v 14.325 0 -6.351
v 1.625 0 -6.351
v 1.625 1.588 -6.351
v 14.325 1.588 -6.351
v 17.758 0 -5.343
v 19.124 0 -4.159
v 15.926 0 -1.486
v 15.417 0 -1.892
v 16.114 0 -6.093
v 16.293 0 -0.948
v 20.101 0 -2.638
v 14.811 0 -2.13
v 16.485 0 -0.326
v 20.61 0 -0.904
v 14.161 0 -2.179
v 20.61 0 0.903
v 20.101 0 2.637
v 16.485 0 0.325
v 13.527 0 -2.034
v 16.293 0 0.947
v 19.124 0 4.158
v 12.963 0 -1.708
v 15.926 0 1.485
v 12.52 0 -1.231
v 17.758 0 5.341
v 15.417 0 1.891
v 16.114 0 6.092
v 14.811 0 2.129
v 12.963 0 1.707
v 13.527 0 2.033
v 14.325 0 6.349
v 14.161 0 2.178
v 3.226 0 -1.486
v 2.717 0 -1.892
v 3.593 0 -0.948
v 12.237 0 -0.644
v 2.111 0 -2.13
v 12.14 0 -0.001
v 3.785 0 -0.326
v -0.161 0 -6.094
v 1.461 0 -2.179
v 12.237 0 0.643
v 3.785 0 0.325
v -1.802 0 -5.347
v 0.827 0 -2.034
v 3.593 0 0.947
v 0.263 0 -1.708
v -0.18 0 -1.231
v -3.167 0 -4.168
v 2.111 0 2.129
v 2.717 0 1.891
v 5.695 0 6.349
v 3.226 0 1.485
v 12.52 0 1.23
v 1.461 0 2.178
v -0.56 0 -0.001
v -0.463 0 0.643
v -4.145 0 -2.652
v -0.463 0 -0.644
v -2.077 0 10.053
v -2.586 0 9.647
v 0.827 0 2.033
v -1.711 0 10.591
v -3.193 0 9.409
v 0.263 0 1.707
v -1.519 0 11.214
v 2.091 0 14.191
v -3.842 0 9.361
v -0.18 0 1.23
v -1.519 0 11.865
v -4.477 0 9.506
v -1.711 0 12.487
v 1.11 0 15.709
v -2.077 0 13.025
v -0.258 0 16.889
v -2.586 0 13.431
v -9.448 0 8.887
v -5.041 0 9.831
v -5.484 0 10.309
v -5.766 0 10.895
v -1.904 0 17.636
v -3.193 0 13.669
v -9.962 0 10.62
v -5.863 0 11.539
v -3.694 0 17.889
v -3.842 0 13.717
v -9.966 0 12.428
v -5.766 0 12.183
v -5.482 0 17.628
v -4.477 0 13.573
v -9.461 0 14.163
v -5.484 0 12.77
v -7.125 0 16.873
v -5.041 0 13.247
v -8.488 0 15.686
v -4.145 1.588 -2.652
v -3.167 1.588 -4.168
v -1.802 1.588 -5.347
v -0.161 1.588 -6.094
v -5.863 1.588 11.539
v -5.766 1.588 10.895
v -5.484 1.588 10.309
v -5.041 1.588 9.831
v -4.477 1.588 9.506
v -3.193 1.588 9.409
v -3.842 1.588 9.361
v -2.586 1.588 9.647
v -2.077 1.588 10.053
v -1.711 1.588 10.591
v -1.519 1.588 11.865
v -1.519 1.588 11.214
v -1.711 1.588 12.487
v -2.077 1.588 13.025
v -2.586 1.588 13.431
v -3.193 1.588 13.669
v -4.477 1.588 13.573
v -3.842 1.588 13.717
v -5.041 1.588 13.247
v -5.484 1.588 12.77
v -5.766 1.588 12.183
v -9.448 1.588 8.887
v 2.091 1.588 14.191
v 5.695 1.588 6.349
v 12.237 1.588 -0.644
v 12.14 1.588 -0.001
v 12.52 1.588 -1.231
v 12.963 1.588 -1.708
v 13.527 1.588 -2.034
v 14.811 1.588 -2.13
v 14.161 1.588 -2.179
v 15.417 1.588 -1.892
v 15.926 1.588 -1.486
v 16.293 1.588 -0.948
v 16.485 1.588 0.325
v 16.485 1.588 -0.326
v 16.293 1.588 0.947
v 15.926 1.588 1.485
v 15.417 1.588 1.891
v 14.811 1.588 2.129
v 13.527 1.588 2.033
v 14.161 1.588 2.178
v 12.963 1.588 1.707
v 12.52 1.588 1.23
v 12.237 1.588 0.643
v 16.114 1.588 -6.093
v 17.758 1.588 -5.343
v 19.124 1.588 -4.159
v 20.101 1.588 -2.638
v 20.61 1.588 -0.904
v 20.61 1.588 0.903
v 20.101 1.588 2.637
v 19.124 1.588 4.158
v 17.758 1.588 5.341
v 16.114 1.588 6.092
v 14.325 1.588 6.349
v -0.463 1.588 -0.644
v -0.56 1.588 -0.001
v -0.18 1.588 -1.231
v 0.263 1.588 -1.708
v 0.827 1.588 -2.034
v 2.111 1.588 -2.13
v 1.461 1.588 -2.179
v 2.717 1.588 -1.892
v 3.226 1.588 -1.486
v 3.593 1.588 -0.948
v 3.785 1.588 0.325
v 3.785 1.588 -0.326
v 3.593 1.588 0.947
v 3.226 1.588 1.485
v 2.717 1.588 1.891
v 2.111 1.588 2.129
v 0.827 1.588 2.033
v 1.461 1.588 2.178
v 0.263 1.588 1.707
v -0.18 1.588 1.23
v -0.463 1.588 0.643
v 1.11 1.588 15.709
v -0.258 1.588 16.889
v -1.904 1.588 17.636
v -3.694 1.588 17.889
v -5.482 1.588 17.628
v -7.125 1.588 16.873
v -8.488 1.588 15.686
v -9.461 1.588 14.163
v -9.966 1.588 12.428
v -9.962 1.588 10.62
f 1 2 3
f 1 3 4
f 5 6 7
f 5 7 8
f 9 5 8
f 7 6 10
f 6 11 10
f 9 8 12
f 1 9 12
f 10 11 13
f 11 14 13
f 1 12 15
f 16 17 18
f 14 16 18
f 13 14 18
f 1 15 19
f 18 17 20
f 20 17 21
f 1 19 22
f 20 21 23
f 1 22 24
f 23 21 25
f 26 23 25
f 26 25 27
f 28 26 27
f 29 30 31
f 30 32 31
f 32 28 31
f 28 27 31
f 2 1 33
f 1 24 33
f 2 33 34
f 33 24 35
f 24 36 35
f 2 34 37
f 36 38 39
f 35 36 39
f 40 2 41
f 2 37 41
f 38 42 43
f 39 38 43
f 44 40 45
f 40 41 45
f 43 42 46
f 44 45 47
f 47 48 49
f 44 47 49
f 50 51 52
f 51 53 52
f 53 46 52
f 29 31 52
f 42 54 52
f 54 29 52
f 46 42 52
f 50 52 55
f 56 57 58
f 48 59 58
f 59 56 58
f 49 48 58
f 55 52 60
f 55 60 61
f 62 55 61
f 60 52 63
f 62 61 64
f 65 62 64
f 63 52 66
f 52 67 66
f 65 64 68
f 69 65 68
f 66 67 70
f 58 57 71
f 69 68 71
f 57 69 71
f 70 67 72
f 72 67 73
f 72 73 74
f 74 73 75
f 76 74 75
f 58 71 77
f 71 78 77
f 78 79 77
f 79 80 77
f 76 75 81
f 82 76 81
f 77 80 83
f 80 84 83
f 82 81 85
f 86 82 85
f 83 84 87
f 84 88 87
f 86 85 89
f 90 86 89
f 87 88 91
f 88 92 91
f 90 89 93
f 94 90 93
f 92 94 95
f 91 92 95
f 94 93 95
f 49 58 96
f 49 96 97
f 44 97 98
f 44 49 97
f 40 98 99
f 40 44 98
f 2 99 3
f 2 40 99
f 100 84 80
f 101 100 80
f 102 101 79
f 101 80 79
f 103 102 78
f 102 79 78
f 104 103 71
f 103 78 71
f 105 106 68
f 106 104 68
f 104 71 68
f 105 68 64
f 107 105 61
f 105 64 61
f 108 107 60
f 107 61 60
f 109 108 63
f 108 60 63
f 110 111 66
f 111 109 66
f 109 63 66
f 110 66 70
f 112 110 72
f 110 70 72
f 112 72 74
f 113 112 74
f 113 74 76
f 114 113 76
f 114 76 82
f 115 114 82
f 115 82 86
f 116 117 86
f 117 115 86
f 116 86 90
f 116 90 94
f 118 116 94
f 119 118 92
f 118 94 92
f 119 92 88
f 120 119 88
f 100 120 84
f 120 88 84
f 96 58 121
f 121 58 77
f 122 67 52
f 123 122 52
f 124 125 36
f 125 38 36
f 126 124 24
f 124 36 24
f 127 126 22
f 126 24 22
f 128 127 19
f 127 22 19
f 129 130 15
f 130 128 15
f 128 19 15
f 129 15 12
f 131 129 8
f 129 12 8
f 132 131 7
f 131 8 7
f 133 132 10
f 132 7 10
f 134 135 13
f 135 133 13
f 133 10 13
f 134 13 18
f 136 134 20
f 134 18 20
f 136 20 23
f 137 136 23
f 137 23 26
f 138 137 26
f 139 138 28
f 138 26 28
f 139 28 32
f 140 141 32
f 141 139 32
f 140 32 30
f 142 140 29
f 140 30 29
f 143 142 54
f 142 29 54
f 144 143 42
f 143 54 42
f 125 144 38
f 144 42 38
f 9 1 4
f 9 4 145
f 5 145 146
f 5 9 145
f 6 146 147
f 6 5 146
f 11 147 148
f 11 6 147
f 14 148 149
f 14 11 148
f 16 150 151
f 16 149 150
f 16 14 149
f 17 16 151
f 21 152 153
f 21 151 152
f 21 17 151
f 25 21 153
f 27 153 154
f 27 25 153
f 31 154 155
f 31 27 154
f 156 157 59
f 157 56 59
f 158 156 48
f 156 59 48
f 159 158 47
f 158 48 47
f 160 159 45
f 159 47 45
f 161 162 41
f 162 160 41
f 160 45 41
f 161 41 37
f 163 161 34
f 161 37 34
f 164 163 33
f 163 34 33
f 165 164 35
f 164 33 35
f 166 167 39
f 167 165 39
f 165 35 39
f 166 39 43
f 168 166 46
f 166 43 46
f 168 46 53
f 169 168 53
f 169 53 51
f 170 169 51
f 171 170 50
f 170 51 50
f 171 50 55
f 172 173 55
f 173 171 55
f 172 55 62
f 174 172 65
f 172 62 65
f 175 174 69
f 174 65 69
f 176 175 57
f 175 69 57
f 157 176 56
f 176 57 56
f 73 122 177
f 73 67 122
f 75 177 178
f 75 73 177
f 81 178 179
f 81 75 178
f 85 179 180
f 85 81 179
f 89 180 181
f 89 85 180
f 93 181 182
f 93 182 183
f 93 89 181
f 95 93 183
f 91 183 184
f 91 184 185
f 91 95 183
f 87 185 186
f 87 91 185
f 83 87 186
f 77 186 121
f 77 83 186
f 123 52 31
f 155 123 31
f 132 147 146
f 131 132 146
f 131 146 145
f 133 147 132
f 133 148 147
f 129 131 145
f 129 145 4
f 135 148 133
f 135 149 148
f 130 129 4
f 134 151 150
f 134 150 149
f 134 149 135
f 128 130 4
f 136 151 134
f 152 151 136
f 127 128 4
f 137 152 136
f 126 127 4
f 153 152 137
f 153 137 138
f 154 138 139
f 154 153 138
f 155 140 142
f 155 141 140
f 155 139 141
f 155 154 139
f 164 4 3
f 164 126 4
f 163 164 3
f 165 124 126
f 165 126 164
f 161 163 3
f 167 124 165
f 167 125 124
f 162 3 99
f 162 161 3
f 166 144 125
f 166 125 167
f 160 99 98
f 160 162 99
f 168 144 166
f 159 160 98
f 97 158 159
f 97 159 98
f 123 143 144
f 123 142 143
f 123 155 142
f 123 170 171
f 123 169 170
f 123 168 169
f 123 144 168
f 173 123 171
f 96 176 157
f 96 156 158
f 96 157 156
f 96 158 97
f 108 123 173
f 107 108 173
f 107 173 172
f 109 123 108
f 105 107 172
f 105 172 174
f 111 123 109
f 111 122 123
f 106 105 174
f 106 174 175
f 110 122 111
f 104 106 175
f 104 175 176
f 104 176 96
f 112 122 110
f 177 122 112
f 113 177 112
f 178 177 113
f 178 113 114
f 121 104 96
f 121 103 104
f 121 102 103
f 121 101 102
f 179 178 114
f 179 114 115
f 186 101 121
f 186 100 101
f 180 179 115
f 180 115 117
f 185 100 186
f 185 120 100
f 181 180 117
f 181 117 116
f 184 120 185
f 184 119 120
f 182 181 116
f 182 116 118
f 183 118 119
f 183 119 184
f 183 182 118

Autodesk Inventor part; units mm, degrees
ref_plane "YZ Plane" through (0, 0, 0) normal (1, 0, 0) x (0, 1, 0)
ref_plane "XZ Plane" through (0, 0, 0) normal (0, 1, 0) x (-1, 0, 0)
ref_plane "XY Plane" through (0, 0, 0) normal (0, 0, 1) x (1, 0, 0)
sketch "Sketch1" plane through (0, 0, 0) normal (0, 1, 0) x (-1, 0, 0)
  circle A0 centre (-14.3247, -0.0006) radius 2.1844
  circle A1 centre (-1.6247, -0.0006) radius 2.1844
  circle A2 centre (3.6787, 11.5391) radius 2.1844
  circle A3 centre (3.6787, 11.5391) radius 6.35
  circle A4 centre (-1.6247, -0.0006) radius 6.35
  circle A5 centre (-14.3247, -0.0006) radius 6.35
  line L0 (-1.6247, -6.3506) -> (-14.3247, -6.3506)
  line L1 (4.1452, -2.6523) -> (9.4485, 8.8874)
  line L2 (-2.0912, 14.1907) -> (-7.3945, 2.651)
  line L3 (-1.6247, 6.3494) -> (-14.3247, 6.3494)
  point P0 (0, 0)
  point P1 (0.252, 16.8851)
  point P2 (-17.7513, 5.3454)
  point P3 (-7.9747, -0.0006)
  point P4 (1.027, 5.7692)
  point P5 (-5.6949, 6.3494)
  dimension "d0" = 12.7
  dimension "d1" = 12.7
  dimension "d2" = 12.7
extrude "Extrusion1" add sketch "Sketch1" along normal blind 1.5875
properties part number "lbL-channelSupport"
